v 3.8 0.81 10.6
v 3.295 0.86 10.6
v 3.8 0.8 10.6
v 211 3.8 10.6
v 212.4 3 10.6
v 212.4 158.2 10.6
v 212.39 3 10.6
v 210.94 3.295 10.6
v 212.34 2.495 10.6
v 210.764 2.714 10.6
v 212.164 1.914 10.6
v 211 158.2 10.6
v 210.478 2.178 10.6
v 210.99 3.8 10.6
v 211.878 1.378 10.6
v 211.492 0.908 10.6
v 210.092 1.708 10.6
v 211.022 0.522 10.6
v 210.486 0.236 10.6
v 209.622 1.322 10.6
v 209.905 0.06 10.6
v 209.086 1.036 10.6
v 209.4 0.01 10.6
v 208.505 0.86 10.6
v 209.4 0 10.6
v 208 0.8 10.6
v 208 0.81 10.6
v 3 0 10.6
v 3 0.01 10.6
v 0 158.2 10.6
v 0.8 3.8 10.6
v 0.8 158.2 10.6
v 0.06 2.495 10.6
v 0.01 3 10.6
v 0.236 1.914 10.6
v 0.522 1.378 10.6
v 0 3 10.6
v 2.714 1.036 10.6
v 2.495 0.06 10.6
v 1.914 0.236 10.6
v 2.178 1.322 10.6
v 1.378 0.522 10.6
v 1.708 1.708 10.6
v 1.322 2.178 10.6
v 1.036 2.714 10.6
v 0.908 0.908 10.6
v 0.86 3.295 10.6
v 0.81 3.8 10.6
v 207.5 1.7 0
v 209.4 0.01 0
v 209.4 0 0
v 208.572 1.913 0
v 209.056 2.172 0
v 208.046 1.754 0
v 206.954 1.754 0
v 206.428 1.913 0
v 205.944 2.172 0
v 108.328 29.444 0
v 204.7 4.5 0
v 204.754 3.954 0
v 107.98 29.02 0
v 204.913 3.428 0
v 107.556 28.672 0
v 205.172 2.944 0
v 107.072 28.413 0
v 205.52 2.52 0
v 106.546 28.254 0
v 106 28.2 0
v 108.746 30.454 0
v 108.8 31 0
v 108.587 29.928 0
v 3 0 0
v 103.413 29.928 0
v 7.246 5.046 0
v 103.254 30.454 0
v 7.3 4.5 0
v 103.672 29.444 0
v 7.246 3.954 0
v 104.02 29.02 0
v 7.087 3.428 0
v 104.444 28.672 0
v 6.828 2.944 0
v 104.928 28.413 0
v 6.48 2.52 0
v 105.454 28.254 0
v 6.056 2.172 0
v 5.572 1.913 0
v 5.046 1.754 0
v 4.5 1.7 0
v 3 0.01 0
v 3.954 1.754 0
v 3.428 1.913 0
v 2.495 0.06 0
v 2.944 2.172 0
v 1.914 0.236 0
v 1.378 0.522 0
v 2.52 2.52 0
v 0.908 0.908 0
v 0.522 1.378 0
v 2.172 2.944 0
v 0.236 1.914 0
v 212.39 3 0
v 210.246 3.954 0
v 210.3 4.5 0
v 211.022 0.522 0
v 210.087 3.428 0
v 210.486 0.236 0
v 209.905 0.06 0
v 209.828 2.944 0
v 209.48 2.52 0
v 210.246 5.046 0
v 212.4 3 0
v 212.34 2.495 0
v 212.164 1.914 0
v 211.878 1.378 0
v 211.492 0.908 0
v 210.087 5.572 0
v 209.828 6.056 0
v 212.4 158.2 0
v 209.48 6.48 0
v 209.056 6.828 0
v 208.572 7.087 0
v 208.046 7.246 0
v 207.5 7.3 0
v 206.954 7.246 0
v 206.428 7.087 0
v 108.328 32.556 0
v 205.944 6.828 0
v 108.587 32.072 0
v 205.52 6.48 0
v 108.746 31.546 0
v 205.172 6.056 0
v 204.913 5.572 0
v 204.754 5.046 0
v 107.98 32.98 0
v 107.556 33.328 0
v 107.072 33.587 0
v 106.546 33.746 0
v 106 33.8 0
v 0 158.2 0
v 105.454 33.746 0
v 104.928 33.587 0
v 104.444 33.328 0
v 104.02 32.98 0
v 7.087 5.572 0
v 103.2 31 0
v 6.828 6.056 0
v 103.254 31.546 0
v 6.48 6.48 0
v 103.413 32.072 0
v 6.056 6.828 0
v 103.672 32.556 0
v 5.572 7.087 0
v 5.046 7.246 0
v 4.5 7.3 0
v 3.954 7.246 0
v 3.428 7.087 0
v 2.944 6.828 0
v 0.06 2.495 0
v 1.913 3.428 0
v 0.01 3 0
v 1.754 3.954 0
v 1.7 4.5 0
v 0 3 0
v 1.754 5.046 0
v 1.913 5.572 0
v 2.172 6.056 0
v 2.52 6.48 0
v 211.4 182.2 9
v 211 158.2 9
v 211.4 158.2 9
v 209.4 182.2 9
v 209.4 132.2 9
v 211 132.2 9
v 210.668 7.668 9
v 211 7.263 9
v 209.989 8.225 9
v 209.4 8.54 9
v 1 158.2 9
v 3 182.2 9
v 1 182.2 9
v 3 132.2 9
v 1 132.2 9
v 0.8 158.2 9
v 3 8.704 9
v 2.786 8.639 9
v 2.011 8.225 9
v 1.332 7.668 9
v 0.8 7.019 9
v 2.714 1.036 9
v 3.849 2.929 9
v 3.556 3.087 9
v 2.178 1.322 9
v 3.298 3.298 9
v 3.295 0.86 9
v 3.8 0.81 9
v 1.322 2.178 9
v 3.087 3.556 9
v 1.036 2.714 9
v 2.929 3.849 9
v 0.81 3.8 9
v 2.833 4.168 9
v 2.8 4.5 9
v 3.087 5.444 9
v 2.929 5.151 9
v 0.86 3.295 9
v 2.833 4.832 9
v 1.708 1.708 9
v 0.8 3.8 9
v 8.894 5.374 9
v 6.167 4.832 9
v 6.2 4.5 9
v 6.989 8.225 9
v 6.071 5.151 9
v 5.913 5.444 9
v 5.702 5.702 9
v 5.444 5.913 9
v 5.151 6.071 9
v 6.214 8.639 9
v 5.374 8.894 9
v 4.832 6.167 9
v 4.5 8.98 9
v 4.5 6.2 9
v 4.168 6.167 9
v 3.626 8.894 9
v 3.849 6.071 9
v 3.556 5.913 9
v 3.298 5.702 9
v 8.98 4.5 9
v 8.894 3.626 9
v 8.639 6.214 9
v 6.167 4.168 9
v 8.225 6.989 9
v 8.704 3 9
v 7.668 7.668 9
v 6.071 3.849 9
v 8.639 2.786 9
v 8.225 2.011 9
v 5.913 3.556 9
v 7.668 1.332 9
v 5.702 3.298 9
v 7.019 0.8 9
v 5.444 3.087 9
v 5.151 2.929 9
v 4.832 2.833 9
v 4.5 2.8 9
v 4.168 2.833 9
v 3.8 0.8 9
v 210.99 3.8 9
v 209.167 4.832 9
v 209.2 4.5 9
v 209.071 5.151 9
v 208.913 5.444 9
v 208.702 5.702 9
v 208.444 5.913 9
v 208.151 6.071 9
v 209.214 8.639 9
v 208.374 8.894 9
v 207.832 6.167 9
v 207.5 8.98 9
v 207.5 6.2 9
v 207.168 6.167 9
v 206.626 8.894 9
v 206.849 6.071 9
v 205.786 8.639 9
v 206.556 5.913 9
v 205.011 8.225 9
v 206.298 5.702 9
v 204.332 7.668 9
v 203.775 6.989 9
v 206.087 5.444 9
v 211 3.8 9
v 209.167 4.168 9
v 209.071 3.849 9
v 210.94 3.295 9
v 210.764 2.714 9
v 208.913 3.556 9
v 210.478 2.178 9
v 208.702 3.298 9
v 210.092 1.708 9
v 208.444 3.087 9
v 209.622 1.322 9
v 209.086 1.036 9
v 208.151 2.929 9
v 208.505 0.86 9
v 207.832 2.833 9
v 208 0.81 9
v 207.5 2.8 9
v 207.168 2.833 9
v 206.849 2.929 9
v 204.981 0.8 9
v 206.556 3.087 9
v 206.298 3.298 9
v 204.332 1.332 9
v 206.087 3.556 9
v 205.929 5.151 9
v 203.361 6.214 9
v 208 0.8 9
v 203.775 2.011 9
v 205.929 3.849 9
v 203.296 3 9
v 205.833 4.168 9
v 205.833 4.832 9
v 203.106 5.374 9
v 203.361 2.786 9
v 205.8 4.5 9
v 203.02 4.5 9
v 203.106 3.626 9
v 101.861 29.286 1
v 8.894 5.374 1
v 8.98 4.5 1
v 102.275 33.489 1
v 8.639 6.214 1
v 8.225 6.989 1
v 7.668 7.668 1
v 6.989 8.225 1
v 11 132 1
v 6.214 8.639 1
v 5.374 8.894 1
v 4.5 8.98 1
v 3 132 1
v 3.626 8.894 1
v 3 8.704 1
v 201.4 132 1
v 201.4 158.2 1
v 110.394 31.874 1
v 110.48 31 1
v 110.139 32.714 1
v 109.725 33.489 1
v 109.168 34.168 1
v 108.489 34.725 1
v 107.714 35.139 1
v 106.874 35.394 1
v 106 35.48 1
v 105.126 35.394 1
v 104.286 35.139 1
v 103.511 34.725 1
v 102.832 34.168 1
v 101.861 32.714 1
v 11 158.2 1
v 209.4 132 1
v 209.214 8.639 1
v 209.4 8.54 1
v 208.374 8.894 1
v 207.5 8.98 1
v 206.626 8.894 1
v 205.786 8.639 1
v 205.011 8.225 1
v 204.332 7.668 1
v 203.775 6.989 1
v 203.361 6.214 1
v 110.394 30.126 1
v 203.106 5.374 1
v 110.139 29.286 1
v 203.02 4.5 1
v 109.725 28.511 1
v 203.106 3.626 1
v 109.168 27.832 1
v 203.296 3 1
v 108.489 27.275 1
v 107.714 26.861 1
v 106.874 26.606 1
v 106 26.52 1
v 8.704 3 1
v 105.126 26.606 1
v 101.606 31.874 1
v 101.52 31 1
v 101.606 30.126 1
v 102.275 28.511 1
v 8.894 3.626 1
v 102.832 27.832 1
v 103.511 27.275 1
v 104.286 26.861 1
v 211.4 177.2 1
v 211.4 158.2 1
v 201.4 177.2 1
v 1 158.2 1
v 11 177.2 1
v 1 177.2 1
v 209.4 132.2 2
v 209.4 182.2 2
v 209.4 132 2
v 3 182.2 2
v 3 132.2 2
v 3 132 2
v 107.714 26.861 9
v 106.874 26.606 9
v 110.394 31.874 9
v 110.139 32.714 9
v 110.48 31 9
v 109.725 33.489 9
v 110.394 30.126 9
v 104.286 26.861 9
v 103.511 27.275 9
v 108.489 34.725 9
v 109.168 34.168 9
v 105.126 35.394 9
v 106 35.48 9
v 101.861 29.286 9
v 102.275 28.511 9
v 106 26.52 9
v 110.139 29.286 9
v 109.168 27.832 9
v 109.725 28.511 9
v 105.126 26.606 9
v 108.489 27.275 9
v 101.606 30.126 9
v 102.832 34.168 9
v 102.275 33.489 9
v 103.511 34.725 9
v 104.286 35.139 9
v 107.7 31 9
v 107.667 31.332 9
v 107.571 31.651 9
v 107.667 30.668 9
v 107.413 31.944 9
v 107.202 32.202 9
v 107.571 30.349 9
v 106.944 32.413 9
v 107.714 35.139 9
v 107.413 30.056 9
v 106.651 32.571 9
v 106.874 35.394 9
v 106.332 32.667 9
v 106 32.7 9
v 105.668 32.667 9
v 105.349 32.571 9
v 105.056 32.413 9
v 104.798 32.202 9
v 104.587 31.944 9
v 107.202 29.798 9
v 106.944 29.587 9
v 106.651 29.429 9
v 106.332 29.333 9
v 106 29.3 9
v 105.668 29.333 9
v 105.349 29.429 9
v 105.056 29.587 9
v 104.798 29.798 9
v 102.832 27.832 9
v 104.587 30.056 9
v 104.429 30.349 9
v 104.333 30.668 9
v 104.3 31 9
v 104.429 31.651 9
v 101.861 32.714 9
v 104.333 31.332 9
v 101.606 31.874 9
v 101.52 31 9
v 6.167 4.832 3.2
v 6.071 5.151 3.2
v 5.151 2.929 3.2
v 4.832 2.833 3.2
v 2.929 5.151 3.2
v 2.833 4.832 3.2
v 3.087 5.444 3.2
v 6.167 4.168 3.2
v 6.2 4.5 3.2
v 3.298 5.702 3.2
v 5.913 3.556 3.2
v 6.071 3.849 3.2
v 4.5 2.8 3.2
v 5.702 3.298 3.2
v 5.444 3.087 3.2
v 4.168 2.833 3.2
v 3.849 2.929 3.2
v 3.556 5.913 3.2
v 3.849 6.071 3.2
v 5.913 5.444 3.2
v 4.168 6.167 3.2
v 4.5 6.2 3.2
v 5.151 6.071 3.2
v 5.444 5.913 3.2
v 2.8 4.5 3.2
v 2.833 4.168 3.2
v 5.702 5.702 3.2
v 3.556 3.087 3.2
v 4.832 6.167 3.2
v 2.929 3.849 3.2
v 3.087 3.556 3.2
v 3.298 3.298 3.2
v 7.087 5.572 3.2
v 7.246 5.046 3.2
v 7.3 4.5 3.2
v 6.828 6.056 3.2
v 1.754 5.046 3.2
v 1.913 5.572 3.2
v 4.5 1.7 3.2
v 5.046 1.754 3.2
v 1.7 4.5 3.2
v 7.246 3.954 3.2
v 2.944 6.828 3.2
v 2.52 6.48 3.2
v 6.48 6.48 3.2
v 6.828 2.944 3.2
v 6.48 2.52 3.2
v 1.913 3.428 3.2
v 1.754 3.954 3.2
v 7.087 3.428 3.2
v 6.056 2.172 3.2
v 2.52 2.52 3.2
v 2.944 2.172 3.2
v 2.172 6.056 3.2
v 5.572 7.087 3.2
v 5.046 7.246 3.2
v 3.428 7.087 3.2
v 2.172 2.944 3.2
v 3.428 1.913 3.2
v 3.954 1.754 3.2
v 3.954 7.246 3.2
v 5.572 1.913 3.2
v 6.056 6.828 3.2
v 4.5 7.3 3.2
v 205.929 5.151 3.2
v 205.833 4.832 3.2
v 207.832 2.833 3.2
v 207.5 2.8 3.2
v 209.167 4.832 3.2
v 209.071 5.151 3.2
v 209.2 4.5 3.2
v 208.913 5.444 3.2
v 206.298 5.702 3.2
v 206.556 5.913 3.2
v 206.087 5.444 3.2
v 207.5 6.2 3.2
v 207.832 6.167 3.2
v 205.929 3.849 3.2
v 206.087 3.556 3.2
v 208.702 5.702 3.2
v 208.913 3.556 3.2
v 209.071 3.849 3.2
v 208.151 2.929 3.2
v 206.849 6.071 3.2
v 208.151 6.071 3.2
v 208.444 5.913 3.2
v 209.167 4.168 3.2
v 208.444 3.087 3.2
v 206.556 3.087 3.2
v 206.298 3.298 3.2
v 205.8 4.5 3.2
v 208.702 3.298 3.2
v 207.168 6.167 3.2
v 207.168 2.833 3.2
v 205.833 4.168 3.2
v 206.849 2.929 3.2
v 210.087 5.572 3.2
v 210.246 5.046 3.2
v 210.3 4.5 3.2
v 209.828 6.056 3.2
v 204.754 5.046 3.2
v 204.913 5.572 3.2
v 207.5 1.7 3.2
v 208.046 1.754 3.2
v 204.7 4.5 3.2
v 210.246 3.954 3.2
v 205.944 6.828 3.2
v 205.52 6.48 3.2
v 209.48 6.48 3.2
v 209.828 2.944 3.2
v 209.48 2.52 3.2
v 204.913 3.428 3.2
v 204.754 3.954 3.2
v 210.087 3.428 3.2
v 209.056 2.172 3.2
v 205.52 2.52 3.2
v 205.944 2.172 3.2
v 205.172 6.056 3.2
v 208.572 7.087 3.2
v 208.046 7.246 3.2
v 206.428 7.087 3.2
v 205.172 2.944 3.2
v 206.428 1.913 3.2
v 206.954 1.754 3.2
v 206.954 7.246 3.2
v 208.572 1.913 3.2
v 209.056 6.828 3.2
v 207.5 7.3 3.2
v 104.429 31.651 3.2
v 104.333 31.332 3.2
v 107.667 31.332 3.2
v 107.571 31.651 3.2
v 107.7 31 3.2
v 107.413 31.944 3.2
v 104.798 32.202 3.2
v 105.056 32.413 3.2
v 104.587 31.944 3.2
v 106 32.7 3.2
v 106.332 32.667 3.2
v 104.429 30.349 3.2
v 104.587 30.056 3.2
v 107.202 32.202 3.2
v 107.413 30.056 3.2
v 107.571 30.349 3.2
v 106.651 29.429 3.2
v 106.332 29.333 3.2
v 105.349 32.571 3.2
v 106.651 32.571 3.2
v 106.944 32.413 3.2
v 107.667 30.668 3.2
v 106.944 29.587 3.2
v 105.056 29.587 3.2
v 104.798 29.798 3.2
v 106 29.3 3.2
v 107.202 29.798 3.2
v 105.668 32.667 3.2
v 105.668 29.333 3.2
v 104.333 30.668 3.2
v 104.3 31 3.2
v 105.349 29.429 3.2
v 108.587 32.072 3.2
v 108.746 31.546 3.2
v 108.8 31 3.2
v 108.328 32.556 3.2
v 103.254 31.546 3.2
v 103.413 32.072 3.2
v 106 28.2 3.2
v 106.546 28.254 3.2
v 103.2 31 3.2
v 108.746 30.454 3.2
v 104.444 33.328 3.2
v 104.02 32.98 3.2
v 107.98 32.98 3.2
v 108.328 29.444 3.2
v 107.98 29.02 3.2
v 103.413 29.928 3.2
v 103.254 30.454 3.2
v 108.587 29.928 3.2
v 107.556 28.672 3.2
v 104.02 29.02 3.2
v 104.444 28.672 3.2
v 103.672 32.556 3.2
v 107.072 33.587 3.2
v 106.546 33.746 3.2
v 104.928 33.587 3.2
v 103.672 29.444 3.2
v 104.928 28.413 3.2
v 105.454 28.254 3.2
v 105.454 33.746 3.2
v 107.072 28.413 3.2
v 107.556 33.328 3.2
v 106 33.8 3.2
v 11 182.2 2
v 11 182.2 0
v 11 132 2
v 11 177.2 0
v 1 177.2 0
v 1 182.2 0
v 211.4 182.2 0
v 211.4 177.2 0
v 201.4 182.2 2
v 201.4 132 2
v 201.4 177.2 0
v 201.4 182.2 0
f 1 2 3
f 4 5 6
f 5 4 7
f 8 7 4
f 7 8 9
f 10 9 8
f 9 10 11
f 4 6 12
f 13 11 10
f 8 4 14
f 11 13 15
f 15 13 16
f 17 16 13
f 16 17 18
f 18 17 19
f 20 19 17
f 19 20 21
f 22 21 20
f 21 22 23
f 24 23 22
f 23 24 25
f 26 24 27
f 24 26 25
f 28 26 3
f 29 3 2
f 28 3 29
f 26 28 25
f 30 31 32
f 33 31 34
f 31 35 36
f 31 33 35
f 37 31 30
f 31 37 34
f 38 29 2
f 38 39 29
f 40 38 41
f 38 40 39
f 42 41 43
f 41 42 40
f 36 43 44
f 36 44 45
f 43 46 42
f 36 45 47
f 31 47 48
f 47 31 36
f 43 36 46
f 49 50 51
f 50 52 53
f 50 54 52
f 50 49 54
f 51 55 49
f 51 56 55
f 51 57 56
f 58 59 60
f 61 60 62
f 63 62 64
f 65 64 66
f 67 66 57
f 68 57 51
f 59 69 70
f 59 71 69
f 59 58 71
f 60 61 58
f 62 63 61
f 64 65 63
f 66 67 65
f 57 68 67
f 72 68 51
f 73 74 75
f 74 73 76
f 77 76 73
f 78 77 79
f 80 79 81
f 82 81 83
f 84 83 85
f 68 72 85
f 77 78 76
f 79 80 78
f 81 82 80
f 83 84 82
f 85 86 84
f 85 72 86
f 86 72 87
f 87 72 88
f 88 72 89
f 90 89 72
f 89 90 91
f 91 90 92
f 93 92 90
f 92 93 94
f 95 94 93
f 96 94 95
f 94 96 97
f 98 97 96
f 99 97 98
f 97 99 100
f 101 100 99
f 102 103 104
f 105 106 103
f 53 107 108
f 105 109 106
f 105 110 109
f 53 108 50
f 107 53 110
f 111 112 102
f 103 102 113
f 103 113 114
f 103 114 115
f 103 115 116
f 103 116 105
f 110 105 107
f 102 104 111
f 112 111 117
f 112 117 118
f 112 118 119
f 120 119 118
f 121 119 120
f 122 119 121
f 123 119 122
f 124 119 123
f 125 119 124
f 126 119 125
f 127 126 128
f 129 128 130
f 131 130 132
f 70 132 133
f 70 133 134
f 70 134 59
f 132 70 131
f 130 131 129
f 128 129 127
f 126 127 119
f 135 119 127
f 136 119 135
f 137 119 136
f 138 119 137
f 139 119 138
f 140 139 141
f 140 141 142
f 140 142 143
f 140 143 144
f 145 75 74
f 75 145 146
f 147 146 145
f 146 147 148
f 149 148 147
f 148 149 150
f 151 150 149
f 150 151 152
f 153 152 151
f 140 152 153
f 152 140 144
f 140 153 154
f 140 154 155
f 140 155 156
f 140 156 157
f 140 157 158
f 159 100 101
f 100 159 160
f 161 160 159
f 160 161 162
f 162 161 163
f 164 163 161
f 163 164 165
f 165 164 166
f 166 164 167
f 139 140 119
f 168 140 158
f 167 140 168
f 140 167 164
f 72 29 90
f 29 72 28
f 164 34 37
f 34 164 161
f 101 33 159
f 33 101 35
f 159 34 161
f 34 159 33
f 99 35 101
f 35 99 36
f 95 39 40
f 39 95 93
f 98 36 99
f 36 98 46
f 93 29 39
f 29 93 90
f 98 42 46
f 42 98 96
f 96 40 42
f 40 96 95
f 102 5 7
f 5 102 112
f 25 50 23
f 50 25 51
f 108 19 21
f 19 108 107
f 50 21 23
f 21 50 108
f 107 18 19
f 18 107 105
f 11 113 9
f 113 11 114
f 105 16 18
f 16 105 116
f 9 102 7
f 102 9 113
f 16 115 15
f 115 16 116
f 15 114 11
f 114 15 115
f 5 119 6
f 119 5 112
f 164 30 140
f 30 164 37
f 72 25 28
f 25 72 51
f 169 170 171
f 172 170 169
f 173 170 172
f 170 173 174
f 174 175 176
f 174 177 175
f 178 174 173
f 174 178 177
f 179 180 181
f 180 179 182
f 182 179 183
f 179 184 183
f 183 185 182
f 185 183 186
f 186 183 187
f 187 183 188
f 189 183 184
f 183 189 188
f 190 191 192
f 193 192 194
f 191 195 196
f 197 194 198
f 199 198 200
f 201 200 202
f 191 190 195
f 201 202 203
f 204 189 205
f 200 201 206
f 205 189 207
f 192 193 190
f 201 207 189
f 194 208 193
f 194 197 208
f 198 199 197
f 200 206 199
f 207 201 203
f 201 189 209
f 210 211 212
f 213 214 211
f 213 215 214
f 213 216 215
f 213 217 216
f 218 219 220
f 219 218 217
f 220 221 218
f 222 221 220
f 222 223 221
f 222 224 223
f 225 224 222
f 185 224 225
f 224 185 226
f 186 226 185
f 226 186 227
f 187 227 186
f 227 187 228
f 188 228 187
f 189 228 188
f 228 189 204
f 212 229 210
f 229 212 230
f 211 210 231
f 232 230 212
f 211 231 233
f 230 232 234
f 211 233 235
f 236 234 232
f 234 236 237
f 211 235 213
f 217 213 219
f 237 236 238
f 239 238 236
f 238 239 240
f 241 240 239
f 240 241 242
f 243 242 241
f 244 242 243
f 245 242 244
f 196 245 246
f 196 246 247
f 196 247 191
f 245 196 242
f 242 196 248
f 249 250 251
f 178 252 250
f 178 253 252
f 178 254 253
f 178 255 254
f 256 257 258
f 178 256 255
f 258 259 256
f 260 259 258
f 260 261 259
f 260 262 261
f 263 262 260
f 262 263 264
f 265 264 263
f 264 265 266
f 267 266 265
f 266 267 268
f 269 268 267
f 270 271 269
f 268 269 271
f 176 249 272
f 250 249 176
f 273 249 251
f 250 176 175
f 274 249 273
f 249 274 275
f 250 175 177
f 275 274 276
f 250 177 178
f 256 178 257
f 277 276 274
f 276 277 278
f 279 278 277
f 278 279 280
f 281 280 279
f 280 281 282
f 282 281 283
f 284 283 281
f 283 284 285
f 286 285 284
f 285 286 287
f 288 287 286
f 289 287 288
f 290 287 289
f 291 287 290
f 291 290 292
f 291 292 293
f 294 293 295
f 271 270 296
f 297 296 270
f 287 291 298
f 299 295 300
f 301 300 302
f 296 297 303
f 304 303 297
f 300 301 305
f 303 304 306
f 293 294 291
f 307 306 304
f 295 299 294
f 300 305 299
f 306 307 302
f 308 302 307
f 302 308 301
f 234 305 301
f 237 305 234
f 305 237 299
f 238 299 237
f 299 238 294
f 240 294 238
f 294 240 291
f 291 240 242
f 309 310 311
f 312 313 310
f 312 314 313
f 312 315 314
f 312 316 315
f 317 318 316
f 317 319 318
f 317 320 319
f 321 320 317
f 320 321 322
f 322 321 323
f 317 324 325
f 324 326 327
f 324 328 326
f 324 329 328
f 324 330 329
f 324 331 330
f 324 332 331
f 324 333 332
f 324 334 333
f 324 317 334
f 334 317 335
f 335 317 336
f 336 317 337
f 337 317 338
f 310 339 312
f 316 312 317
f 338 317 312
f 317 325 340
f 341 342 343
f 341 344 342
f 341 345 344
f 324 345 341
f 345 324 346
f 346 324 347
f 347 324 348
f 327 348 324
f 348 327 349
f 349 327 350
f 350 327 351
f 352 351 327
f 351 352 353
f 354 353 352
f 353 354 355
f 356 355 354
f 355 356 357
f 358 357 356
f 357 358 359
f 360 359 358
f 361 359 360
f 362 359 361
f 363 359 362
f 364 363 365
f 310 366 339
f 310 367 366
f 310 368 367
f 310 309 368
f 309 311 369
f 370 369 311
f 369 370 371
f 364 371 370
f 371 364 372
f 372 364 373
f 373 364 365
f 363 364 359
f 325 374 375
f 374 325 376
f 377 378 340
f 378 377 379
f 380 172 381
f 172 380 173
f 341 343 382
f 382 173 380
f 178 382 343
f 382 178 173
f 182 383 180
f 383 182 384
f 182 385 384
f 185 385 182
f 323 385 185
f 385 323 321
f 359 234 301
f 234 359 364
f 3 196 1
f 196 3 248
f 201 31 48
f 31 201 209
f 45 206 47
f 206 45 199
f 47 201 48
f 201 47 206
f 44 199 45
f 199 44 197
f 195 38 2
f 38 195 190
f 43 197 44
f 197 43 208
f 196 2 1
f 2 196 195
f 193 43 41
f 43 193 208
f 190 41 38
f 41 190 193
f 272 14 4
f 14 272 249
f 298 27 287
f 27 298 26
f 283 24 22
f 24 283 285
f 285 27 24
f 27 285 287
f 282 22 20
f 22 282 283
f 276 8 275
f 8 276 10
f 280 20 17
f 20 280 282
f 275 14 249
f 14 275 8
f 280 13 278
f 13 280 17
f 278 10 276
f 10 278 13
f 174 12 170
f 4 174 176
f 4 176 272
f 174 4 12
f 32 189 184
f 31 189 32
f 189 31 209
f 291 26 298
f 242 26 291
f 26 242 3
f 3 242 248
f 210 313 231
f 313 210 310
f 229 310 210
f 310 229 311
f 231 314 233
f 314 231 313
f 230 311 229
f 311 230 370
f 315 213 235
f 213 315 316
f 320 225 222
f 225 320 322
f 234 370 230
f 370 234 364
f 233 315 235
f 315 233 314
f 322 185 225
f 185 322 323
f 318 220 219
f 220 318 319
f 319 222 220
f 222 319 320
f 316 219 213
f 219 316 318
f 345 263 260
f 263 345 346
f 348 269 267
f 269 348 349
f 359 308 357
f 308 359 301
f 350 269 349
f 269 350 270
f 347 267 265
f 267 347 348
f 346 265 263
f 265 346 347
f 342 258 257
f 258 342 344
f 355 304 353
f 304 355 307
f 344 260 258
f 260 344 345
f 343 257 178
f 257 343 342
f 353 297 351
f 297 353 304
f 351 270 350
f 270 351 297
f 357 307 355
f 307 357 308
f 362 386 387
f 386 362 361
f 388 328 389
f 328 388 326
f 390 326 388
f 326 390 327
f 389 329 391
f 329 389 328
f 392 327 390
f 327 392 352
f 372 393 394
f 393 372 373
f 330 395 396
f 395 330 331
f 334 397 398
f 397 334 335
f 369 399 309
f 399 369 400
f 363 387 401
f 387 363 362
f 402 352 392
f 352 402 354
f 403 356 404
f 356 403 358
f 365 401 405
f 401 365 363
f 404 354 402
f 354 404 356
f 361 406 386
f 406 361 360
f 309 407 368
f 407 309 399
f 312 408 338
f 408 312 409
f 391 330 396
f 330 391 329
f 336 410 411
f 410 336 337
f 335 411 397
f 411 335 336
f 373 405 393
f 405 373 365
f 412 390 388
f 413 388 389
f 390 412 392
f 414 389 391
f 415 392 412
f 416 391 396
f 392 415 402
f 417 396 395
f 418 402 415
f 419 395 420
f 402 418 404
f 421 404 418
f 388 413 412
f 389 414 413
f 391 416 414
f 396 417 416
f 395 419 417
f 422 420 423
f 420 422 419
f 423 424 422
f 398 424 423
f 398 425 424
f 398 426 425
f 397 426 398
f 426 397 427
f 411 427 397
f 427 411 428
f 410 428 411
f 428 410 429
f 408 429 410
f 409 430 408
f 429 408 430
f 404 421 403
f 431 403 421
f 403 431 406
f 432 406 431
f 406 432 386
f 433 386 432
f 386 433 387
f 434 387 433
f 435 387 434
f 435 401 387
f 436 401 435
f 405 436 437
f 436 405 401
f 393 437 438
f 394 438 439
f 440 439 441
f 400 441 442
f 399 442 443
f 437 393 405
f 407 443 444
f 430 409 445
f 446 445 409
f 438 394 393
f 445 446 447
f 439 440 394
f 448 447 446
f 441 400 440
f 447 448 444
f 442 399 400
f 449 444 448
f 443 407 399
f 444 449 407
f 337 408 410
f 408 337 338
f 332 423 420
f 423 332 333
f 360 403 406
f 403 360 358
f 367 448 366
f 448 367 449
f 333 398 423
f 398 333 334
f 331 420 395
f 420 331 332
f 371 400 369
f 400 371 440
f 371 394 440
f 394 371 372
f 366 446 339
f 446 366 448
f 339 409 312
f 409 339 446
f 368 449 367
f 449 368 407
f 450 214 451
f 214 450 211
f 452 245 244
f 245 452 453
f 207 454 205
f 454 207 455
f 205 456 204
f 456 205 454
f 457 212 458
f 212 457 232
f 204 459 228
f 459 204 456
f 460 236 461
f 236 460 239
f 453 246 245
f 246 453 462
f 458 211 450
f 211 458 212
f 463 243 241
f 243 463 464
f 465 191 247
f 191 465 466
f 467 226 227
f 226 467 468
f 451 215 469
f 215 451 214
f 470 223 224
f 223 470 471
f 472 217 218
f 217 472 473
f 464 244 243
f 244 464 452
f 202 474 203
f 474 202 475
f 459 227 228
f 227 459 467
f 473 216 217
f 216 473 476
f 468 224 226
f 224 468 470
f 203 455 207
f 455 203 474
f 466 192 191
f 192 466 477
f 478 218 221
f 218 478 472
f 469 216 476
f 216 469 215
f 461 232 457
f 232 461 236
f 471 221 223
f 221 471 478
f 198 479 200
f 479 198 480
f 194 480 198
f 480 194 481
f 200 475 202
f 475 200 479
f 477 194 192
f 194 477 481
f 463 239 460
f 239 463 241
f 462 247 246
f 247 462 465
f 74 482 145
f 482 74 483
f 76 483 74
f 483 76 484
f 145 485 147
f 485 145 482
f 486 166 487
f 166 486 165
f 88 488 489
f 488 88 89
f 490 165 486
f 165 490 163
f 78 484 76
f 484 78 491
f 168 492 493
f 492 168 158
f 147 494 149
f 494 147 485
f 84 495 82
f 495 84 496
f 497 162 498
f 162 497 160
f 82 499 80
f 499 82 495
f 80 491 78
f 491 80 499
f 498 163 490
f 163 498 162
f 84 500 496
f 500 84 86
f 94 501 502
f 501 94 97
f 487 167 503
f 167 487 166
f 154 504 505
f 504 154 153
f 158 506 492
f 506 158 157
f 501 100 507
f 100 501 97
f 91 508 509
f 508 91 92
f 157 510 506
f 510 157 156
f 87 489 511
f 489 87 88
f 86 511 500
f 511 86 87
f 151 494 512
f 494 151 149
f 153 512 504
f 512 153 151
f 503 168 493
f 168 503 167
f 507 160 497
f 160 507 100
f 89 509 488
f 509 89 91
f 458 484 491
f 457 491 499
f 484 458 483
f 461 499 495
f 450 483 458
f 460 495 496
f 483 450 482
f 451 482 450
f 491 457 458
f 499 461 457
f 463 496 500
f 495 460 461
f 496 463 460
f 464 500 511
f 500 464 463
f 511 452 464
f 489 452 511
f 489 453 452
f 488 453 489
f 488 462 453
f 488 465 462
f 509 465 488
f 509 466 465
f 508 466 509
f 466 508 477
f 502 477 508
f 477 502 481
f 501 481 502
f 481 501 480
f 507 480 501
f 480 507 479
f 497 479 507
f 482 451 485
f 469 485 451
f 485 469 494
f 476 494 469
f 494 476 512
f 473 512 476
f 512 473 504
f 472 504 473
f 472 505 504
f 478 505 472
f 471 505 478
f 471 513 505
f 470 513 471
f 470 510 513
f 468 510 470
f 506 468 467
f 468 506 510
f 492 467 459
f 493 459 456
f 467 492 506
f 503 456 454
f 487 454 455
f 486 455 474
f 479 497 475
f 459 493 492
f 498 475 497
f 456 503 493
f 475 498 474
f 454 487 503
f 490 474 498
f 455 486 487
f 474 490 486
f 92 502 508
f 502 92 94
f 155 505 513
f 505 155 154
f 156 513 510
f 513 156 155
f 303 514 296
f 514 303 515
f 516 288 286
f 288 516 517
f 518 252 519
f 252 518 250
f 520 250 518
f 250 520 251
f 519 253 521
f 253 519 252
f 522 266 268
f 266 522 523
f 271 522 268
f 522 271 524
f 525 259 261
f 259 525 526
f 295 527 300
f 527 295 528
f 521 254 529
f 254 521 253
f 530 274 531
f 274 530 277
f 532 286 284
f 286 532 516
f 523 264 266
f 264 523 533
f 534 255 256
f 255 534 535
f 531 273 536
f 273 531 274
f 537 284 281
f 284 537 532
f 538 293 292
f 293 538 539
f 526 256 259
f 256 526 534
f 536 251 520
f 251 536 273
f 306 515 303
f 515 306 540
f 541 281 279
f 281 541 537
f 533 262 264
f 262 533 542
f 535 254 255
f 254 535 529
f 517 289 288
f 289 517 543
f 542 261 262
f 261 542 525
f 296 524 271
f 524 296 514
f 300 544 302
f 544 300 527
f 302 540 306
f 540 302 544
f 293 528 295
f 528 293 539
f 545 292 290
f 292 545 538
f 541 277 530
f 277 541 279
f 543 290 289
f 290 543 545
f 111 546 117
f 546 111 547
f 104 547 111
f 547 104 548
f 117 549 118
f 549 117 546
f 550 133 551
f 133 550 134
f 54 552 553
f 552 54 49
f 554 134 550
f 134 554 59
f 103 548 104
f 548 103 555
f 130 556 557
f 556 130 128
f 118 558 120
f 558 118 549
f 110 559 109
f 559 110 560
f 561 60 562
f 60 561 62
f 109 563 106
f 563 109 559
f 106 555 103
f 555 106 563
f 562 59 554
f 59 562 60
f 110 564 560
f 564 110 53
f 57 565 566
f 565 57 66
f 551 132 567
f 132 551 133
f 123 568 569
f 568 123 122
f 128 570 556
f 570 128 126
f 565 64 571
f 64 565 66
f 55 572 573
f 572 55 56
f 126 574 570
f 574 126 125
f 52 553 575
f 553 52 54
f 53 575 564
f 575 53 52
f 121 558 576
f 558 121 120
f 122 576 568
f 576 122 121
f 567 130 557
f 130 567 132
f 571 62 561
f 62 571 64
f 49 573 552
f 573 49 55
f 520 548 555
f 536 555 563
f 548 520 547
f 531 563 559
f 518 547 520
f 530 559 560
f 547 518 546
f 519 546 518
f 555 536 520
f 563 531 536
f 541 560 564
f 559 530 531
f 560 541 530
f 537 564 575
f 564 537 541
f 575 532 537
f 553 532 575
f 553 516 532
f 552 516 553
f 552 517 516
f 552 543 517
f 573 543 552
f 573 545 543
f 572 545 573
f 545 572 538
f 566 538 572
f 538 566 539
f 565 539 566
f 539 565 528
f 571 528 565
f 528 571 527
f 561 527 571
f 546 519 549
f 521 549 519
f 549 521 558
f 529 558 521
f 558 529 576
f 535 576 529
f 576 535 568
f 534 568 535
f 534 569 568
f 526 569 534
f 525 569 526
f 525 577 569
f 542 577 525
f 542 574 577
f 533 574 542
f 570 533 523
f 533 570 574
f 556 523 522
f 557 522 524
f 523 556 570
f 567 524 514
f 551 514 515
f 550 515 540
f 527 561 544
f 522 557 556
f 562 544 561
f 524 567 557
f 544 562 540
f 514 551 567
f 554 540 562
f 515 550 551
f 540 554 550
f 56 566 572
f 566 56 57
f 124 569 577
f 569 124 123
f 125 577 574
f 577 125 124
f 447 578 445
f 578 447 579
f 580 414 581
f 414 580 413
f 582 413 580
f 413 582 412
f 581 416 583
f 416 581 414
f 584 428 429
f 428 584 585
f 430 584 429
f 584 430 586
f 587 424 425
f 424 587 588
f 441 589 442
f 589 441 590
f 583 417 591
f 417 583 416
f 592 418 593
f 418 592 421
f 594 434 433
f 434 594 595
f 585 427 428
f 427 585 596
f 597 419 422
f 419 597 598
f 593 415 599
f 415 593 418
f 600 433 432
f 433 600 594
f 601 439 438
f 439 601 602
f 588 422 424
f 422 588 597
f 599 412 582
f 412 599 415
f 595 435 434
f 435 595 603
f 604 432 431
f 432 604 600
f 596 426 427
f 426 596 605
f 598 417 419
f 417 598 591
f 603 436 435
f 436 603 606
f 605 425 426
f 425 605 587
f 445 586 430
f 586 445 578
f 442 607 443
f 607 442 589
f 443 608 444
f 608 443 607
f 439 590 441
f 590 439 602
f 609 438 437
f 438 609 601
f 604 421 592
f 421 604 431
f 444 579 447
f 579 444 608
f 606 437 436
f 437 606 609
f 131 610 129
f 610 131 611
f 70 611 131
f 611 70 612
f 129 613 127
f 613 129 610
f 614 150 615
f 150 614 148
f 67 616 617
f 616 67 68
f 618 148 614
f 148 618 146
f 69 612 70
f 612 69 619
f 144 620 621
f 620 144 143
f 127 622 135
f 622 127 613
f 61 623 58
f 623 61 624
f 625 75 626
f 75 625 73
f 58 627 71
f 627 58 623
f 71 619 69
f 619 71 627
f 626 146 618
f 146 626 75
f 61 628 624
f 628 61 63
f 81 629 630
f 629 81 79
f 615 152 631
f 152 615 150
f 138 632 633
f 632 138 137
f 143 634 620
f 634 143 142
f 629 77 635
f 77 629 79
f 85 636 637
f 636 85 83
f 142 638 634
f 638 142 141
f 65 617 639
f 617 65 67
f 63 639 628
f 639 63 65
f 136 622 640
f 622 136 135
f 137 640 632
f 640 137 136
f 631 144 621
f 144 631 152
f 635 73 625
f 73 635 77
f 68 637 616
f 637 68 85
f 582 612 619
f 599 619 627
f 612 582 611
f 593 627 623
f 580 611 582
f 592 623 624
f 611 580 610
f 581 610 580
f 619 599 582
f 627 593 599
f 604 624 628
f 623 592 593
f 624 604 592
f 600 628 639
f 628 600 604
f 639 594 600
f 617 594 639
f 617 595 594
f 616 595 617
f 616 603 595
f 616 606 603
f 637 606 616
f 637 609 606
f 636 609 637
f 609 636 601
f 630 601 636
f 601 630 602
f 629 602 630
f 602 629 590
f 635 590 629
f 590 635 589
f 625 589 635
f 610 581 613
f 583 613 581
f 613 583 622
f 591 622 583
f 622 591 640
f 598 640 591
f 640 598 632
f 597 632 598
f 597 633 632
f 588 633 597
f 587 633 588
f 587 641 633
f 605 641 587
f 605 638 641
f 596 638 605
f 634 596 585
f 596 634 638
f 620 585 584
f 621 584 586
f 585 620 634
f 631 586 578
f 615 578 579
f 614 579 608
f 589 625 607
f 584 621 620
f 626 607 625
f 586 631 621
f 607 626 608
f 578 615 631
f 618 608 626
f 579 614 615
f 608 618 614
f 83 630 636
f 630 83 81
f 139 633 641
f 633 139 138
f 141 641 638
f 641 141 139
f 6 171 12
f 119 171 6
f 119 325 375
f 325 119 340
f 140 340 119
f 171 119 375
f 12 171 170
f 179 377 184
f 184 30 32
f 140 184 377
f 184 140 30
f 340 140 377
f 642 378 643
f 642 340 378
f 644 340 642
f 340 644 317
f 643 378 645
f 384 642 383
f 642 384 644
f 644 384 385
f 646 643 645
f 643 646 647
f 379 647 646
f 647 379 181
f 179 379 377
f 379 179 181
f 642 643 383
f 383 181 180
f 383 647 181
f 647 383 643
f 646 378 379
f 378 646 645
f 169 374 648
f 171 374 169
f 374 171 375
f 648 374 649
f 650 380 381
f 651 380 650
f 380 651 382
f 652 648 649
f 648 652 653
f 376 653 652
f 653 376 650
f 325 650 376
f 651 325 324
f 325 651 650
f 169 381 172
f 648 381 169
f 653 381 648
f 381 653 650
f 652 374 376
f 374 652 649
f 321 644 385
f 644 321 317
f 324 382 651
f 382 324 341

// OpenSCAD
board_width = 210;
board_height = 314;
wall_width = 1;
board_overlap = 2;
tol = 0.2;
screw_radius = 1.7;
screw_head_radius = 2.8;
screw_head_height = 3;
screw_offset = 3.5;
standoff_height = 8;
standoff_radius = screw_head_radius * 1.6;

interlock_width = 10;

case_width = board_width + (wall_width + tol) * 2;
case_height = board_height + (wall_width + tol) * 2;
case_depth = 1.6 + standoff_height + wall_width;

standoff_positions = [
    [screw_offset, screw_offset],
    [board_width - screw_offset, screw_offset],
    [board_width / 2, 30],
    [screw_offset, board_height - screw_offset],
    [board_width - screw_offset, board_height - screw_offset],
    [board_width / 2, 172]
];

module meniscus(height, radius) {
    difference() {
        cube([radius + 0.1, radius + 0.1, height]);
        translate([-0.1, -0.1, -0.1]) {
            cylinder(height + 0.1, radius + 0.1, radius + 0.1, $fn=32);
        }
    }
}

module rounded_cube(x, y, z, r = 3) {
    difference() {
        cube([x, y, z]);
        translate([x - r, y - r]) meniscus(z, r);
        translate([r, y - r]) rotate([0, 0, 90]) meniscus(z, r);
        translate([r, r]) rotate([0, 0, 180]) meniscus(z, r);
        translate([x - r, r]) rotate([0, 0, 270]) meniscus(z, r);
    }
}

module screw_hole(x, y) {
    translate([x + wall_width, y + wall_width, -tol]) {
        cylinder(
            standoff_height + wall_width + tol * 2,
            screw_radius,
            screw_radius,
            $fn=32
        );
        cylinder(
            screw_head_height + tol * 2,
            screw_head_radius,
            screw_head_radius,
            $fn=32
        );
    }
}

module standoff(x, y) {
    translate([x + wall_width, y + wall_width, wall_width]) {
        cylinder(standoff_height, standoff_radius, standoff_radius, $fn=32);
    }
}


module full_case() {
    difference() {
        union() {
            difference() {
                rounded_cube(case_width, case_height, case_depth);
                translate([wall_width + board_overlap, wall_width + board_overlap, wall_width]) {
                    rounded_cube(
                        case_width - board_overlap * 2 - wall_width * 2,
                        case_height - board_overlap * 2 - wall_width * 2 + tol,
                        standoff_height
                    );
                }
                translate([
                    wall_width - tol,
                    wall_width - tol,
                    standoff_height + wall_width
                ]) {
                    rounded_cube(
                        board_width + tol,
                        board_height + tol,
                        case_depth - standoff_height
                    );
                }
            }
            for (pos = standoff_positions) {
                standoff(pos[0], pos[1]);
            }
        }
        for (pos = standoff_positions) {
            screw_hole(pos[0], pos[1]);
        }
    }
}

module interlock_holes(t) {
    // Make hole "t" bigger than insert.
    hole_size = 5;
    y = case_height / 2 - t / 2 + 25 - hole_size - wall_width;
    translate([wall_width - t / 2, y, 0]) {
        cube([interlock_width + t, hole_size + t, wall_width * 2]);
    }
    translate([case_width - wall_width - t / 2 - interlock_width, y, 0]) {
        cube([interlock_width + t, hole_size + t, wall_width * 2]);
    }
    translate([case_width - wall_width - board_overlap - t / 2, y - 50 + hole_size, wall_width]) {
        cube([board_overlap + t, 50 + t, standoff_height]);
    }
    translate([wall_width - t / 2, y - 50 + hole_size, wall_width]) {
        cube([board_overlap + t, 50 + t, standoff_height]);
    }
}

module front_half() {
    translate([0, -0, 0]) {
        union() {
            intersection() {
                full_case();
                cube([case_width, case_height / 2, case_depth]);
            }
            translate([wall_width, board_height / 2 - 25, wall_width]) {
                cube([interlock_width, 50, wall_width]);
            }
            translate([case_width - wall_width - interlock_width, board_height / 2 - 25, wall_width]) {
                cube([interlock_width, 50, wall_width]);
            }
            interlock_holes(0);
        }
    }
}

module back_half() {
    translate([0, 0, 0]) {
        difference() {
            intersection() {
                full_case();
                translate([0, case_height / 2, 0]) {
                    cube([case_width, case_height / 2, case_depth]);
                }
            }
            interlock_holes(tol);
        }
    }
}

front_half();
//back_half();
